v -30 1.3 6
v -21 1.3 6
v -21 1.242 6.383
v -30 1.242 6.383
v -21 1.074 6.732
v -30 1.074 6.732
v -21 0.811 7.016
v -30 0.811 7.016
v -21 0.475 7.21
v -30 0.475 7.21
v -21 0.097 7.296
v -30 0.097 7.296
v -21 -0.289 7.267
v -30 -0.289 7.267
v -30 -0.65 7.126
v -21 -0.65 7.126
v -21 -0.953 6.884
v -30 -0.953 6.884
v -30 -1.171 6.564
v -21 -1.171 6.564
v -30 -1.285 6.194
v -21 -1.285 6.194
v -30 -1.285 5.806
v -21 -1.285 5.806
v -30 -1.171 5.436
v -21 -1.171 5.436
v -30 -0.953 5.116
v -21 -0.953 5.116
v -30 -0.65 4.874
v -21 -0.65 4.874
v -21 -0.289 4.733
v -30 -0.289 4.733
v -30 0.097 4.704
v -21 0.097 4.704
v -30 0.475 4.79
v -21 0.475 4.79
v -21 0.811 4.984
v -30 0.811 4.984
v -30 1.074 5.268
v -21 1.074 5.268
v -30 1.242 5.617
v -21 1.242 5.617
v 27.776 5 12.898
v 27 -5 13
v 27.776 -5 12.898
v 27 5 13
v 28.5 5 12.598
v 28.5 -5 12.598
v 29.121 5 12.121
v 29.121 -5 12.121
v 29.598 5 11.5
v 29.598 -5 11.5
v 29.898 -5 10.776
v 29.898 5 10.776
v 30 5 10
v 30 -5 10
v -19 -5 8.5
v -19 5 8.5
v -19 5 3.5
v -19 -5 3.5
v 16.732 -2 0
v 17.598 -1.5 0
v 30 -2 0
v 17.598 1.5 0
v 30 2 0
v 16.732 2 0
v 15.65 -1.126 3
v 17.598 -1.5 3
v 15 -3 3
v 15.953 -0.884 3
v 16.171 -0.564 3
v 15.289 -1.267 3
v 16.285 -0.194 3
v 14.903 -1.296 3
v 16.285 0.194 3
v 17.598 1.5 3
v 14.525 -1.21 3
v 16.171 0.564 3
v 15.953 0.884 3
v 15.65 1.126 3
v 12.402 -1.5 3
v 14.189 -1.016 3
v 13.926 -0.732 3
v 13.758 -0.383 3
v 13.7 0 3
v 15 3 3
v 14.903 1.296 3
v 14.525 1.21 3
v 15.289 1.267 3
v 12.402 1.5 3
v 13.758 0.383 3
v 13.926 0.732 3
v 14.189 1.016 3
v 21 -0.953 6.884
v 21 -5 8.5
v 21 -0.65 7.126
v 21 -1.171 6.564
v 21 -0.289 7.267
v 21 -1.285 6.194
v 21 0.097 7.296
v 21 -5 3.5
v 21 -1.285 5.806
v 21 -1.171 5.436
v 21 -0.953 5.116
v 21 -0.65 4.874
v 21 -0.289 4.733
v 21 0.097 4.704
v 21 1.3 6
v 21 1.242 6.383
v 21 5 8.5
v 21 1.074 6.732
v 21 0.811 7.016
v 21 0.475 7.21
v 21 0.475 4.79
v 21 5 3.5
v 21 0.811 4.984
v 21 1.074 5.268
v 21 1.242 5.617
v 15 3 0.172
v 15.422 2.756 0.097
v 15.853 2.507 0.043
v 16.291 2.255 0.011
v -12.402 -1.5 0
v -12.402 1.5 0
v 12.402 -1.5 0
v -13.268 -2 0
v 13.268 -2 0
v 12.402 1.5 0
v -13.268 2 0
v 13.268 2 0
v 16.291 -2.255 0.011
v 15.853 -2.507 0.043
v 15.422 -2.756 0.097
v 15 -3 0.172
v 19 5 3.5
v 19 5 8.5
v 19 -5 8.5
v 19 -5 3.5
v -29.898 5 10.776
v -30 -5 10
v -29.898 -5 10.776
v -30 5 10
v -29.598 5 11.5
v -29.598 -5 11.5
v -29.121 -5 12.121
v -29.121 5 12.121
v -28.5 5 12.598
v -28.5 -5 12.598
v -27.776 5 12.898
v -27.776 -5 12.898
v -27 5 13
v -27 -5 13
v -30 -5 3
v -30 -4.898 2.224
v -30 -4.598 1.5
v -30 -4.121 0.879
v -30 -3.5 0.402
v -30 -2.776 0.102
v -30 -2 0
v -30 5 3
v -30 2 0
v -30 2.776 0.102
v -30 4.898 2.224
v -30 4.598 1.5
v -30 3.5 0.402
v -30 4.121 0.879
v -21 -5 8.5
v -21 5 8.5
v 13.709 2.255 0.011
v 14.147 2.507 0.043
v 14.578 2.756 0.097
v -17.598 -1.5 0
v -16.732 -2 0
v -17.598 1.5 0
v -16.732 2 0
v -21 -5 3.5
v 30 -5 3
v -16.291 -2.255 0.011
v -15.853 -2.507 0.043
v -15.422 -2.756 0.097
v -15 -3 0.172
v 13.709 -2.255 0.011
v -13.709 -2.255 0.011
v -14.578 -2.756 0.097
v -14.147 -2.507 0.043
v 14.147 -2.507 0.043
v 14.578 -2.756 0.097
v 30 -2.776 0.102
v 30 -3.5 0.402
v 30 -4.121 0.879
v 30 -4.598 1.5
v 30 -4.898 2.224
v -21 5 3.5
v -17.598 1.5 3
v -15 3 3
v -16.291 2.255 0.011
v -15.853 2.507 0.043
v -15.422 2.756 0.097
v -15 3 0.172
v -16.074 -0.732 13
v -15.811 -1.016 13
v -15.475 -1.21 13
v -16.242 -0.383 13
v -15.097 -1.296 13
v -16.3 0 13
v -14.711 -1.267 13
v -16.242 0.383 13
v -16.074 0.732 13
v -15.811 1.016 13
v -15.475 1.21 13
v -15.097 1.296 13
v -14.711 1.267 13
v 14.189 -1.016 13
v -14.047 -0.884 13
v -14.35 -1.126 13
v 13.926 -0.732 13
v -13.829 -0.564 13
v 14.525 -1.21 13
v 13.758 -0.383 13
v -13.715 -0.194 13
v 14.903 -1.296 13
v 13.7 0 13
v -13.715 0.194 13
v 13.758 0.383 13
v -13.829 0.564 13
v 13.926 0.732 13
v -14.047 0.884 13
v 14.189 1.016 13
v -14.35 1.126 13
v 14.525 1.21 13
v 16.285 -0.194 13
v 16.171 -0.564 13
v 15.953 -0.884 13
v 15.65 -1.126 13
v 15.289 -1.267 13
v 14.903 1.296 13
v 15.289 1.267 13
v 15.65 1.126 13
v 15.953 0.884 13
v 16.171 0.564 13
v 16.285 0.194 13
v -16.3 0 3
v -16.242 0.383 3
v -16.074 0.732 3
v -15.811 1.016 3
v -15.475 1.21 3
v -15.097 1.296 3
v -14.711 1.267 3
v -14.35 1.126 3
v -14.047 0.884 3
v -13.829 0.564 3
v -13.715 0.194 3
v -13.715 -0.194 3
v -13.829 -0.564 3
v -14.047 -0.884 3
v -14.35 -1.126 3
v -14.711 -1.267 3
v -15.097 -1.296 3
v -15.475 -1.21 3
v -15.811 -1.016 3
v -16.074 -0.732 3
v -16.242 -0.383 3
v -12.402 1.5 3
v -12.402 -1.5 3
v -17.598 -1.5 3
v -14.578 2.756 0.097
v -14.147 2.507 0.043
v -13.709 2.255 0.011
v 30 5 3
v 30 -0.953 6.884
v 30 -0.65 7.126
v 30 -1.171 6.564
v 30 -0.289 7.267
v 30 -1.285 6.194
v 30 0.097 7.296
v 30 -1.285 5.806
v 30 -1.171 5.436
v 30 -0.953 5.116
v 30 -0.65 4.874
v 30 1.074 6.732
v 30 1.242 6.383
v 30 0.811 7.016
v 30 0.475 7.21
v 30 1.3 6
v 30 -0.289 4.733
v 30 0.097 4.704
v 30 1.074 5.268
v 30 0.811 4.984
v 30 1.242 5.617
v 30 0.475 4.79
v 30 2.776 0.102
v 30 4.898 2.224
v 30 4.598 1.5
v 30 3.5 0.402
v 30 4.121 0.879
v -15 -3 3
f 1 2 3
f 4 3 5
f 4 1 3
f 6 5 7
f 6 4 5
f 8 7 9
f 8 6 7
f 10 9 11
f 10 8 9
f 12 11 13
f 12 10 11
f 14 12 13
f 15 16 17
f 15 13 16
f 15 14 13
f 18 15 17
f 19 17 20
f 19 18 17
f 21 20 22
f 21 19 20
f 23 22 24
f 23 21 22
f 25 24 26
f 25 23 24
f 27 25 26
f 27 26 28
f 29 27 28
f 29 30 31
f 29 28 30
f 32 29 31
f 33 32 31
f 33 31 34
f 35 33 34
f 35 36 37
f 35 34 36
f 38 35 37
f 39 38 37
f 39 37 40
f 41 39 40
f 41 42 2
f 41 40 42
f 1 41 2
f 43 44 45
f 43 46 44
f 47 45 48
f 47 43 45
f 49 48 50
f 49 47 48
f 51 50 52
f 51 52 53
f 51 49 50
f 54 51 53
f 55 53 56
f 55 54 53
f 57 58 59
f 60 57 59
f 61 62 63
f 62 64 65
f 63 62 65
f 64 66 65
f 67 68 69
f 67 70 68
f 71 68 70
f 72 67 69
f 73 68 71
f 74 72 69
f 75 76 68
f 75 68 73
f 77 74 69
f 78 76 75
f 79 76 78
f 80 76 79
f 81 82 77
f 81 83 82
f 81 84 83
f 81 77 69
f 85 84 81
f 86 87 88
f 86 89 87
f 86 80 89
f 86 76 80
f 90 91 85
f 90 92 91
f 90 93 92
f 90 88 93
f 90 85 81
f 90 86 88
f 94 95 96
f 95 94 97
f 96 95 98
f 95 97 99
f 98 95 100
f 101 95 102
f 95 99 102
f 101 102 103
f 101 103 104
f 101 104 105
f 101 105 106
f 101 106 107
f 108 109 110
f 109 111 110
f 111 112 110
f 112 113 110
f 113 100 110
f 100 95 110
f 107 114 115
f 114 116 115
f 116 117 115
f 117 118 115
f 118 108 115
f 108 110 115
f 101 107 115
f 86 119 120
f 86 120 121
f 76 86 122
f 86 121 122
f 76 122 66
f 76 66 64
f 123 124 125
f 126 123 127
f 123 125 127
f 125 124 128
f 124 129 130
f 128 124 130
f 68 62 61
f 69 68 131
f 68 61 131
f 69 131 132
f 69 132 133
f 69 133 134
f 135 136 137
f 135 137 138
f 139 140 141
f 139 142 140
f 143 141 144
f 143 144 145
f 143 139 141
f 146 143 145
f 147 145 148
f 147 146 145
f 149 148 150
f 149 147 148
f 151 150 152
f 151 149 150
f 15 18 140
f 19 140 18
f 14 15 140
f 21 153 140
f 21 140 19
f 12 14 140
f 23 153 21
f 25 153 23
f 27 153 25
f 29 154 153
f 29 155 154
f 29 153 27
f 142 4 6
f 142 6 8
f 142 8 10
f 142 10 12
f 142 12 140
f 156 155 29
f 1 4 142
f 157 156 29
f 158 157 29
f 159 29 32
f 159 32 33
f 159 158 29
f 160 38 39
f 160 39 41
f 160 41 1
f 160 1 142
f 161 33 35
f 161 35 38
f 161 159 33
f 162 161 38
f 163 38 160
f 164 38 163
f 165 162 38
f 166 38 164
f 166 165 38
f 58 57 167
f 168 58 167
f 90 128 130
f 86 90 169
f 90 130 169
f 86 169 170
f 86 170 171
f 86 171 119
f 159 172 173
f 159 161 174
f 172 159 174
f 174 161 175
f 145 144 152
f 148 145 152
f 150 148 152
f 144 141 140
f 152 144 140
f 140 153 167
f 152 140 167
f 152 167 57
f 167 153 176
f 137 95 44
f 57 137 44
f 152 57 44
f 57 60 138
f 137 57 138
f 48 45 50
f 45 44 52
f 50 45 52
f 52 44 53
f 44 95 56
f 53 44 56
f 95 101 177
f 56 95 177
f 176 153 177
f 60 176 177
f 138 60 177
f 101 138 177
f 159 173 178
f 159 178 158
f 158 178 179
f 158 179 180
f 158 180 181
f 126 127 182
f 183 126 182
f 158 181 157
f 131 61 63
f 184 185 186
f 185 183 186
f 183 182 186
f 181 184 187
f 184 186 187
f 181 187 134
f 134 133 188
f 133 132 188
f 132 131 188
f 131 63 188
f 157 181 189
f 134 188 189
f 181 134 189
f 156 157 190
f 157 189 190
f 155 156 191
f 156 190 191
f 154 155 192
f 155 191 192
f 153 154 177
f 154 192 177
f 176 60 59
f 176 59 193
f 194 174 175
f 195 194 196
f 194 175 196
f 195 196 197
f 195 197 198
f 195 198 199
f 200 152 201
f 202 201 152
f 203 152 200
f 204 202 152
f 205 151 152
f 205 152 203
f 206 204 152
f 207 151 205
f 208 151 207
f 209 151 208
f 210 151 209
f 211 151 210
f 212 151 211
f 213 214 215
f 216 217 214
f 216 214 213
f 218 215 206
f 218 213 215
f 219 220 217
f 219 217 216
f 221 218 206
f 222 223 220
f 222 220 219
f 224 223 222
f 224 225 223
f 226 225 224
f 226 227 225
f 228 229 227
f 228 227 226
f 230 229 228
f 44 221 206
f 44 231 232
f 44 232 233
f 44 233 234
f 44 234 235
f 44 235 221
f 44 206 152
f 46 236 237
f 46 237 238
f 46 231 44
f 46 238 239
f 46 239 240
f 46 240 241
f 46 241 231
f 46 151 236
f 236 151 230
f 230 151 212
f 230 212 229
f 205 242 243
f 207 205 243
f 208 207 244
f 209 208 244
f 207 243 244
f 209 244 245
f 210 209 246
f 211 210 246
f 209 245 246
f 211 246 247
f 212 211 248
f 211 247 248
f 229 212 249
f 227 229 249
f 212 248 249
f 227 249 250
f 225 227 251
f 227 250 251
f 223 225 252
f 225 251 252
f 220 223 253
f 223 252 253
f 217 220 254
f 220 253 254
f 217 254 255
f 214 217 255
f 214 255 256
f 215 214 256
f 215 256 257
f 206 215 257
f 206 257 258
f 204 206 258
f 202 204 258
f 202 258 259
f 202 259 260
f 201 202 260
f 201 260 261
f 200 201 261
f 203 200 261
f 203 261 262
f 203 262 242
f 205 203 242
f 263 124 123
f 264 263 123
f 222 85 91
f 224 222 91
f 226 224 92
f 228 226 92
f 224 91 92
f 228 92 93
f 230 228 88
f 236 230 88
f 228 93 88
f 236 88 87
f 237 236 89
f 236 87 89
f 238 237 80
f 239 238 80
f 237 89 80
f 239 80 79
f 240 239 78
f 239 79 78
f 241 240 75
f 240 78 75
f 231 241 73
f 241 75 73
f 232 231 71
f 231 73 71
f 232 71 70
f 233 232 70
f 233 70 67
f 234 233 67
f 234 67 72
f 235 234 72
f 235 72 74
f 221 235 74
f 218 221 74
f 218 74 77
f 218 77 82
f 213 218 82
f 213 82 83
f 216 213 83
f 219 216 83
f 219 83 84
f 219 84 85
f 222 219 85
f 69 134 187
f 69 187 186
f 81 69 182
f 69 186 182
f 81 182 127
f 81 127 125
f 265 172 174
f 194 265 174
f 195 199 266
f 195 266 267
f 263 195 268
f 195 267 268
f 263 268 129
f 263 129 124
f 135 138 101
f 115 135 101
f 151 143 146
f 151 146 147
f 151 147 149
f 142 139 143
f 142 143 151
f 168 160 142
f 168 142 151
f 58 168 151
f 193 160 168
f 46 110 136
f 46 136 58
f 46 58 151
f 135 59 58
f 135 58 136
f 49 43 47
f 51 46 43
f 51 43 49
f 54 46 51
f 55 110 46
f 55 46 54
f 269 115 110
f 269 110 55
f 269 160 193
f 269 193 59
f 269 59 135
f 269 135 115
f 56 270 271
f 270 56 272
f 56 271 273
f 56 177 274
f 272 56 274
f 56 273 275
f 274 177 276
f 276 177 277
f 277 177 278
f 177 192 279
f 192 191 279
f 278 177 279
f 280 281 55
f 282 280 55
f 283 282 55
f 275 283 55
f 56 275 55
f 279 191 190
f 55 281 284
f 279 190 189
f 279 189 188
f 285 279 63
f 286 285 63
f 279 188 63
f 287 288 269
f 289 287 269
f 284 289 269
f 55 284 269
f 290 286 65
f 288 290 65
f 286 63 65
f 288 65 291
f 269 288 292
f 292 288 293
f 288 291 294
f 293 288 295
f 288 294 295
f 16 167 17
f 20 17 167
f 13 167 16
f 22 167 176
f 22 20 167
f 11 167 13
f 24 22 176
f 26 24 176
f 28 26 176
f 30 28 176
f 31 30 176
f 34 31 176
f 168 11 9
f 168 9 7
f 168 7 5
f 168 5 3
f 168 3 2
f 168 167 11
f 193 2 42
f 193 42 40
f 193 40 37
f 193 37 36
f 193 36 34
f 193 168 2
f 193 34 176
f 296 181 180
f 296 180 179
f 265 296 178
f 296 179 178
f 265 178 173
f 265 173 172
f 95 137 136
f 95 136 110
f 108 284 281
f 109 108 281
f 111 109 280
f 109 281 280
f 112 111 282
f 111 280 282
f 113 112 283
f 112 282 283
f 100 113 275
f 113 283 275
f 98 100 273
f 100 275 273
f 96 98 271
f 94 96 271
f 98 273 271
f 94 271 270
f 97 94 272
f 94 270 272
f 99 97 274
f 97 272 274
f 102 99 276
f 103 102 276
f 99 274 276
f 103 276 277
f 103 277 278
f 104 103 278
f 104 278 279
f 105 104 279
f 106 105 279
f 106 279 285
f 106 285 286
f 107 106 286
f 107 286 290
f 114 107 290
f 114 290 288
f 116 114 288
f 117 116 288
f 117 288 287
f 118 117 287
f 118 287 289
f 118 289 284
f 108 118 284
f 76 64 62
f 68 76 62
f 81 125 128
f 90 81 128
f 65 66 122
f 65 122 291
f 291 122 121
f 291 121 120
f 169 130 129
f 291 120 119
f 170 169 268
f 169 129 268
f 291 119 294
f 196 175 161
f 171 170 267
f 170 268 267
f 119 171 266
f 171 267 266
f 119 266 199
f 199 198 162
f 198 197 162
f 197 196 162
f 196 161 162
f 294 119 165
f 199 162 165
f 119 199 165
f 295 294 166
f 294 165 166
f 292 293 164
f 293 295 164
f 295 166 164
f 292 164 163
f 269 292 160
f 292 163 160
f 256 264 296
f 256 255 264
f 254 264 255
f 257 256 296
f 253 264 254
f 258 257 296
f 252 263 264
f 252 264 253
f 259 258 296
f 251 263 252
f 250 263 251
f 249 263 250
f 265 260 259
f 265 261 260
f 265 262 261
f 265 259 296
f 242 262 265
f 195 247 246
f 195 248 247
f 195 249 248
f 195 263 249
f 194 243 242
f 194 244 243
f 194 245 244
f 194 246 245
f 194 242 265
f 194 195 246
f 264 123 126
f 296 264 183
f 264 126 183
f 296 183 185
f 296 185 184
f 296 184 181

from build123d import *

# Parameters (mm, degrees)
SKETCH2_W           = 60
SKETCH2_H           = 10
BOSS_EXTRUDE1_DEPTH = 13
CUT_EXTRUDE1_DEPTH  = 3
SKETCH4_R           = 1.3
CUT_EXTRUDE2_DEPTH  = 33.015621187
FILLET1_R           = 3
FILLET2_R           = 3
SKETCH5_R           = 1.3
CUT_EXTRUDE3_DEPTH  = 10
SKETCH6_W           = 2
SKETCH6_H           = 5
CUT_EXTRUDE4_DEPTH  = 35.190641995


with BuildPart() as part:
    # Sketch2 → Boss-Extrude1 (new body)
    with BuildSketch(Plane.XY):
        Rectangle(SKETCH2_W, SKETCH2_H)
    extrude(amount=BOSS_EXTRUDE1_DEPTH)

    # Sketch3 → Cut-Extrude1 (cut)
    with BuildSketch(Plane(origin=(0, 0, 0), x_dir=(-1, 0, 0), z_dir=(0, 0, -1))):
        Polygon((-15, -3), (-12.401923789, -1.5), (-12.401923789, 1.5), (-15, 3), (-17.598076211, 1.5), (-17.598076211, -1.5), align=None)
        Polygon((15, -3), (17.598076211, -1.5), (17.598076211, 1.5), (15, 3), (12.401923789, 1.5), (12.401923789, -1.5), align=None)
    extrude(amount=-CUT_EXTRUDE1_DEPTH, mode=Mode.SUBTRACT)

    # Sketch4 → Cut-Extrude2 (cut, through all)
    with BuildSketch(Plane(origin=(0, 0, 3), x_dir=(-1, 0, 0), z_dir=(0, 0, -1))):
        with Locations((-15, 0)):
            Circle(SKETCH4_R)
        with Locations((15, 0)):
            Circle(SKETCH4_R)
    extrude(amount=-CUT_EXTRUDE2_DEPTH, mode=Mode.SUBTRACT)

    # Fillet1
    # the kernel refuses this fillet: 3 mm, written as the material it takes off along each edge
    with BuildSketch(Plane(origin=(37.5, -5, 0), x_dir=(0, 1, 0), z_dir=(-1, 0, 0))) as fillet1_piece_1:
        with BuildLine():
            CenterArc((FILLET1_R, -FILLET1_R), FILLET1_R, 90, 90)
            Line((0, -FILLET1_R), (0, 0))
            Line((0, 0), (FILLET1_R, 0))
        make_face()
    extrude(amount=75, mode=Mode.SUBTRACT)
    with BuildSketch(Plane(origin=(-37.5, 5, 0), x_dir=(0, 0, 1), z_dir=(1, 0, 0))) as fillet1_piece_2:
        with BuildLine():
            CenterArc((FILLET1_R, FILLET1_R), FILLET1_R, 180, 90)
            Line((0, FILLET1_R), (0, 0))
            Line((0, 0), (FILLET1_R, 0))
        make_face()
    extrude(amount=75, mode=Mode.SUBTRACT)

    # Fillet2
    fillet2_edges = [part.edges().sort_by_distance(p)[0] for p in [
        (-30, 0, 13),
        (30, 0, 13),
    ]]
    fillet(fillet2_edges, radius=FILLET2_R)

    # Sketch5 → Cut-Extrude3 (cut)
    with BuildSketch(Plane(origin=(30, 0, 0), x_dir=(0, 0, -1), z_dir=(1, 0, 0))):
        with Locations(Location((-6, 0, 0), (0, 0, 90))):
            Circle(SKETCH5_R)
    cut_extrude3 = extrude(amount=-CUT_EXTRUDE3_DEPTH, mode=Mode.SUBTRACT)

    # Sketch6 → Cut-Extrude4 (cut, symmetric)
    with BuildSketch(Plane(origin=(0, 5, 0), x_dir=(1, 0, 0), z_dir=(0, 1, 0))):
        with Locations((20, -6)):
            Rectangle(SKETCH6_W, SKETCH6_H)
    cut_extrude4 = extrude(amount=CUT_EXTRUDE4_DEPTH, both=True, mode=Mode.SUBTRACT)

    # Mirror1: Cut-Extrude3, Cut-Extrude4 across plane
    add(cut_extrude3.mirror(Plane(origin=(0, 0, 0), x_dir=(0, 0, 1), z_dir=(1, 0, 0))), mode=Mode.SUBTRACT)
    add(cut_extrude4.mirror(Plane(origin=(0, 0, 0), x_dir=(0, 0, 1), z_dir=(1, 0, 0))), mode=Mode.SUBTRACT)


solid = part.part
